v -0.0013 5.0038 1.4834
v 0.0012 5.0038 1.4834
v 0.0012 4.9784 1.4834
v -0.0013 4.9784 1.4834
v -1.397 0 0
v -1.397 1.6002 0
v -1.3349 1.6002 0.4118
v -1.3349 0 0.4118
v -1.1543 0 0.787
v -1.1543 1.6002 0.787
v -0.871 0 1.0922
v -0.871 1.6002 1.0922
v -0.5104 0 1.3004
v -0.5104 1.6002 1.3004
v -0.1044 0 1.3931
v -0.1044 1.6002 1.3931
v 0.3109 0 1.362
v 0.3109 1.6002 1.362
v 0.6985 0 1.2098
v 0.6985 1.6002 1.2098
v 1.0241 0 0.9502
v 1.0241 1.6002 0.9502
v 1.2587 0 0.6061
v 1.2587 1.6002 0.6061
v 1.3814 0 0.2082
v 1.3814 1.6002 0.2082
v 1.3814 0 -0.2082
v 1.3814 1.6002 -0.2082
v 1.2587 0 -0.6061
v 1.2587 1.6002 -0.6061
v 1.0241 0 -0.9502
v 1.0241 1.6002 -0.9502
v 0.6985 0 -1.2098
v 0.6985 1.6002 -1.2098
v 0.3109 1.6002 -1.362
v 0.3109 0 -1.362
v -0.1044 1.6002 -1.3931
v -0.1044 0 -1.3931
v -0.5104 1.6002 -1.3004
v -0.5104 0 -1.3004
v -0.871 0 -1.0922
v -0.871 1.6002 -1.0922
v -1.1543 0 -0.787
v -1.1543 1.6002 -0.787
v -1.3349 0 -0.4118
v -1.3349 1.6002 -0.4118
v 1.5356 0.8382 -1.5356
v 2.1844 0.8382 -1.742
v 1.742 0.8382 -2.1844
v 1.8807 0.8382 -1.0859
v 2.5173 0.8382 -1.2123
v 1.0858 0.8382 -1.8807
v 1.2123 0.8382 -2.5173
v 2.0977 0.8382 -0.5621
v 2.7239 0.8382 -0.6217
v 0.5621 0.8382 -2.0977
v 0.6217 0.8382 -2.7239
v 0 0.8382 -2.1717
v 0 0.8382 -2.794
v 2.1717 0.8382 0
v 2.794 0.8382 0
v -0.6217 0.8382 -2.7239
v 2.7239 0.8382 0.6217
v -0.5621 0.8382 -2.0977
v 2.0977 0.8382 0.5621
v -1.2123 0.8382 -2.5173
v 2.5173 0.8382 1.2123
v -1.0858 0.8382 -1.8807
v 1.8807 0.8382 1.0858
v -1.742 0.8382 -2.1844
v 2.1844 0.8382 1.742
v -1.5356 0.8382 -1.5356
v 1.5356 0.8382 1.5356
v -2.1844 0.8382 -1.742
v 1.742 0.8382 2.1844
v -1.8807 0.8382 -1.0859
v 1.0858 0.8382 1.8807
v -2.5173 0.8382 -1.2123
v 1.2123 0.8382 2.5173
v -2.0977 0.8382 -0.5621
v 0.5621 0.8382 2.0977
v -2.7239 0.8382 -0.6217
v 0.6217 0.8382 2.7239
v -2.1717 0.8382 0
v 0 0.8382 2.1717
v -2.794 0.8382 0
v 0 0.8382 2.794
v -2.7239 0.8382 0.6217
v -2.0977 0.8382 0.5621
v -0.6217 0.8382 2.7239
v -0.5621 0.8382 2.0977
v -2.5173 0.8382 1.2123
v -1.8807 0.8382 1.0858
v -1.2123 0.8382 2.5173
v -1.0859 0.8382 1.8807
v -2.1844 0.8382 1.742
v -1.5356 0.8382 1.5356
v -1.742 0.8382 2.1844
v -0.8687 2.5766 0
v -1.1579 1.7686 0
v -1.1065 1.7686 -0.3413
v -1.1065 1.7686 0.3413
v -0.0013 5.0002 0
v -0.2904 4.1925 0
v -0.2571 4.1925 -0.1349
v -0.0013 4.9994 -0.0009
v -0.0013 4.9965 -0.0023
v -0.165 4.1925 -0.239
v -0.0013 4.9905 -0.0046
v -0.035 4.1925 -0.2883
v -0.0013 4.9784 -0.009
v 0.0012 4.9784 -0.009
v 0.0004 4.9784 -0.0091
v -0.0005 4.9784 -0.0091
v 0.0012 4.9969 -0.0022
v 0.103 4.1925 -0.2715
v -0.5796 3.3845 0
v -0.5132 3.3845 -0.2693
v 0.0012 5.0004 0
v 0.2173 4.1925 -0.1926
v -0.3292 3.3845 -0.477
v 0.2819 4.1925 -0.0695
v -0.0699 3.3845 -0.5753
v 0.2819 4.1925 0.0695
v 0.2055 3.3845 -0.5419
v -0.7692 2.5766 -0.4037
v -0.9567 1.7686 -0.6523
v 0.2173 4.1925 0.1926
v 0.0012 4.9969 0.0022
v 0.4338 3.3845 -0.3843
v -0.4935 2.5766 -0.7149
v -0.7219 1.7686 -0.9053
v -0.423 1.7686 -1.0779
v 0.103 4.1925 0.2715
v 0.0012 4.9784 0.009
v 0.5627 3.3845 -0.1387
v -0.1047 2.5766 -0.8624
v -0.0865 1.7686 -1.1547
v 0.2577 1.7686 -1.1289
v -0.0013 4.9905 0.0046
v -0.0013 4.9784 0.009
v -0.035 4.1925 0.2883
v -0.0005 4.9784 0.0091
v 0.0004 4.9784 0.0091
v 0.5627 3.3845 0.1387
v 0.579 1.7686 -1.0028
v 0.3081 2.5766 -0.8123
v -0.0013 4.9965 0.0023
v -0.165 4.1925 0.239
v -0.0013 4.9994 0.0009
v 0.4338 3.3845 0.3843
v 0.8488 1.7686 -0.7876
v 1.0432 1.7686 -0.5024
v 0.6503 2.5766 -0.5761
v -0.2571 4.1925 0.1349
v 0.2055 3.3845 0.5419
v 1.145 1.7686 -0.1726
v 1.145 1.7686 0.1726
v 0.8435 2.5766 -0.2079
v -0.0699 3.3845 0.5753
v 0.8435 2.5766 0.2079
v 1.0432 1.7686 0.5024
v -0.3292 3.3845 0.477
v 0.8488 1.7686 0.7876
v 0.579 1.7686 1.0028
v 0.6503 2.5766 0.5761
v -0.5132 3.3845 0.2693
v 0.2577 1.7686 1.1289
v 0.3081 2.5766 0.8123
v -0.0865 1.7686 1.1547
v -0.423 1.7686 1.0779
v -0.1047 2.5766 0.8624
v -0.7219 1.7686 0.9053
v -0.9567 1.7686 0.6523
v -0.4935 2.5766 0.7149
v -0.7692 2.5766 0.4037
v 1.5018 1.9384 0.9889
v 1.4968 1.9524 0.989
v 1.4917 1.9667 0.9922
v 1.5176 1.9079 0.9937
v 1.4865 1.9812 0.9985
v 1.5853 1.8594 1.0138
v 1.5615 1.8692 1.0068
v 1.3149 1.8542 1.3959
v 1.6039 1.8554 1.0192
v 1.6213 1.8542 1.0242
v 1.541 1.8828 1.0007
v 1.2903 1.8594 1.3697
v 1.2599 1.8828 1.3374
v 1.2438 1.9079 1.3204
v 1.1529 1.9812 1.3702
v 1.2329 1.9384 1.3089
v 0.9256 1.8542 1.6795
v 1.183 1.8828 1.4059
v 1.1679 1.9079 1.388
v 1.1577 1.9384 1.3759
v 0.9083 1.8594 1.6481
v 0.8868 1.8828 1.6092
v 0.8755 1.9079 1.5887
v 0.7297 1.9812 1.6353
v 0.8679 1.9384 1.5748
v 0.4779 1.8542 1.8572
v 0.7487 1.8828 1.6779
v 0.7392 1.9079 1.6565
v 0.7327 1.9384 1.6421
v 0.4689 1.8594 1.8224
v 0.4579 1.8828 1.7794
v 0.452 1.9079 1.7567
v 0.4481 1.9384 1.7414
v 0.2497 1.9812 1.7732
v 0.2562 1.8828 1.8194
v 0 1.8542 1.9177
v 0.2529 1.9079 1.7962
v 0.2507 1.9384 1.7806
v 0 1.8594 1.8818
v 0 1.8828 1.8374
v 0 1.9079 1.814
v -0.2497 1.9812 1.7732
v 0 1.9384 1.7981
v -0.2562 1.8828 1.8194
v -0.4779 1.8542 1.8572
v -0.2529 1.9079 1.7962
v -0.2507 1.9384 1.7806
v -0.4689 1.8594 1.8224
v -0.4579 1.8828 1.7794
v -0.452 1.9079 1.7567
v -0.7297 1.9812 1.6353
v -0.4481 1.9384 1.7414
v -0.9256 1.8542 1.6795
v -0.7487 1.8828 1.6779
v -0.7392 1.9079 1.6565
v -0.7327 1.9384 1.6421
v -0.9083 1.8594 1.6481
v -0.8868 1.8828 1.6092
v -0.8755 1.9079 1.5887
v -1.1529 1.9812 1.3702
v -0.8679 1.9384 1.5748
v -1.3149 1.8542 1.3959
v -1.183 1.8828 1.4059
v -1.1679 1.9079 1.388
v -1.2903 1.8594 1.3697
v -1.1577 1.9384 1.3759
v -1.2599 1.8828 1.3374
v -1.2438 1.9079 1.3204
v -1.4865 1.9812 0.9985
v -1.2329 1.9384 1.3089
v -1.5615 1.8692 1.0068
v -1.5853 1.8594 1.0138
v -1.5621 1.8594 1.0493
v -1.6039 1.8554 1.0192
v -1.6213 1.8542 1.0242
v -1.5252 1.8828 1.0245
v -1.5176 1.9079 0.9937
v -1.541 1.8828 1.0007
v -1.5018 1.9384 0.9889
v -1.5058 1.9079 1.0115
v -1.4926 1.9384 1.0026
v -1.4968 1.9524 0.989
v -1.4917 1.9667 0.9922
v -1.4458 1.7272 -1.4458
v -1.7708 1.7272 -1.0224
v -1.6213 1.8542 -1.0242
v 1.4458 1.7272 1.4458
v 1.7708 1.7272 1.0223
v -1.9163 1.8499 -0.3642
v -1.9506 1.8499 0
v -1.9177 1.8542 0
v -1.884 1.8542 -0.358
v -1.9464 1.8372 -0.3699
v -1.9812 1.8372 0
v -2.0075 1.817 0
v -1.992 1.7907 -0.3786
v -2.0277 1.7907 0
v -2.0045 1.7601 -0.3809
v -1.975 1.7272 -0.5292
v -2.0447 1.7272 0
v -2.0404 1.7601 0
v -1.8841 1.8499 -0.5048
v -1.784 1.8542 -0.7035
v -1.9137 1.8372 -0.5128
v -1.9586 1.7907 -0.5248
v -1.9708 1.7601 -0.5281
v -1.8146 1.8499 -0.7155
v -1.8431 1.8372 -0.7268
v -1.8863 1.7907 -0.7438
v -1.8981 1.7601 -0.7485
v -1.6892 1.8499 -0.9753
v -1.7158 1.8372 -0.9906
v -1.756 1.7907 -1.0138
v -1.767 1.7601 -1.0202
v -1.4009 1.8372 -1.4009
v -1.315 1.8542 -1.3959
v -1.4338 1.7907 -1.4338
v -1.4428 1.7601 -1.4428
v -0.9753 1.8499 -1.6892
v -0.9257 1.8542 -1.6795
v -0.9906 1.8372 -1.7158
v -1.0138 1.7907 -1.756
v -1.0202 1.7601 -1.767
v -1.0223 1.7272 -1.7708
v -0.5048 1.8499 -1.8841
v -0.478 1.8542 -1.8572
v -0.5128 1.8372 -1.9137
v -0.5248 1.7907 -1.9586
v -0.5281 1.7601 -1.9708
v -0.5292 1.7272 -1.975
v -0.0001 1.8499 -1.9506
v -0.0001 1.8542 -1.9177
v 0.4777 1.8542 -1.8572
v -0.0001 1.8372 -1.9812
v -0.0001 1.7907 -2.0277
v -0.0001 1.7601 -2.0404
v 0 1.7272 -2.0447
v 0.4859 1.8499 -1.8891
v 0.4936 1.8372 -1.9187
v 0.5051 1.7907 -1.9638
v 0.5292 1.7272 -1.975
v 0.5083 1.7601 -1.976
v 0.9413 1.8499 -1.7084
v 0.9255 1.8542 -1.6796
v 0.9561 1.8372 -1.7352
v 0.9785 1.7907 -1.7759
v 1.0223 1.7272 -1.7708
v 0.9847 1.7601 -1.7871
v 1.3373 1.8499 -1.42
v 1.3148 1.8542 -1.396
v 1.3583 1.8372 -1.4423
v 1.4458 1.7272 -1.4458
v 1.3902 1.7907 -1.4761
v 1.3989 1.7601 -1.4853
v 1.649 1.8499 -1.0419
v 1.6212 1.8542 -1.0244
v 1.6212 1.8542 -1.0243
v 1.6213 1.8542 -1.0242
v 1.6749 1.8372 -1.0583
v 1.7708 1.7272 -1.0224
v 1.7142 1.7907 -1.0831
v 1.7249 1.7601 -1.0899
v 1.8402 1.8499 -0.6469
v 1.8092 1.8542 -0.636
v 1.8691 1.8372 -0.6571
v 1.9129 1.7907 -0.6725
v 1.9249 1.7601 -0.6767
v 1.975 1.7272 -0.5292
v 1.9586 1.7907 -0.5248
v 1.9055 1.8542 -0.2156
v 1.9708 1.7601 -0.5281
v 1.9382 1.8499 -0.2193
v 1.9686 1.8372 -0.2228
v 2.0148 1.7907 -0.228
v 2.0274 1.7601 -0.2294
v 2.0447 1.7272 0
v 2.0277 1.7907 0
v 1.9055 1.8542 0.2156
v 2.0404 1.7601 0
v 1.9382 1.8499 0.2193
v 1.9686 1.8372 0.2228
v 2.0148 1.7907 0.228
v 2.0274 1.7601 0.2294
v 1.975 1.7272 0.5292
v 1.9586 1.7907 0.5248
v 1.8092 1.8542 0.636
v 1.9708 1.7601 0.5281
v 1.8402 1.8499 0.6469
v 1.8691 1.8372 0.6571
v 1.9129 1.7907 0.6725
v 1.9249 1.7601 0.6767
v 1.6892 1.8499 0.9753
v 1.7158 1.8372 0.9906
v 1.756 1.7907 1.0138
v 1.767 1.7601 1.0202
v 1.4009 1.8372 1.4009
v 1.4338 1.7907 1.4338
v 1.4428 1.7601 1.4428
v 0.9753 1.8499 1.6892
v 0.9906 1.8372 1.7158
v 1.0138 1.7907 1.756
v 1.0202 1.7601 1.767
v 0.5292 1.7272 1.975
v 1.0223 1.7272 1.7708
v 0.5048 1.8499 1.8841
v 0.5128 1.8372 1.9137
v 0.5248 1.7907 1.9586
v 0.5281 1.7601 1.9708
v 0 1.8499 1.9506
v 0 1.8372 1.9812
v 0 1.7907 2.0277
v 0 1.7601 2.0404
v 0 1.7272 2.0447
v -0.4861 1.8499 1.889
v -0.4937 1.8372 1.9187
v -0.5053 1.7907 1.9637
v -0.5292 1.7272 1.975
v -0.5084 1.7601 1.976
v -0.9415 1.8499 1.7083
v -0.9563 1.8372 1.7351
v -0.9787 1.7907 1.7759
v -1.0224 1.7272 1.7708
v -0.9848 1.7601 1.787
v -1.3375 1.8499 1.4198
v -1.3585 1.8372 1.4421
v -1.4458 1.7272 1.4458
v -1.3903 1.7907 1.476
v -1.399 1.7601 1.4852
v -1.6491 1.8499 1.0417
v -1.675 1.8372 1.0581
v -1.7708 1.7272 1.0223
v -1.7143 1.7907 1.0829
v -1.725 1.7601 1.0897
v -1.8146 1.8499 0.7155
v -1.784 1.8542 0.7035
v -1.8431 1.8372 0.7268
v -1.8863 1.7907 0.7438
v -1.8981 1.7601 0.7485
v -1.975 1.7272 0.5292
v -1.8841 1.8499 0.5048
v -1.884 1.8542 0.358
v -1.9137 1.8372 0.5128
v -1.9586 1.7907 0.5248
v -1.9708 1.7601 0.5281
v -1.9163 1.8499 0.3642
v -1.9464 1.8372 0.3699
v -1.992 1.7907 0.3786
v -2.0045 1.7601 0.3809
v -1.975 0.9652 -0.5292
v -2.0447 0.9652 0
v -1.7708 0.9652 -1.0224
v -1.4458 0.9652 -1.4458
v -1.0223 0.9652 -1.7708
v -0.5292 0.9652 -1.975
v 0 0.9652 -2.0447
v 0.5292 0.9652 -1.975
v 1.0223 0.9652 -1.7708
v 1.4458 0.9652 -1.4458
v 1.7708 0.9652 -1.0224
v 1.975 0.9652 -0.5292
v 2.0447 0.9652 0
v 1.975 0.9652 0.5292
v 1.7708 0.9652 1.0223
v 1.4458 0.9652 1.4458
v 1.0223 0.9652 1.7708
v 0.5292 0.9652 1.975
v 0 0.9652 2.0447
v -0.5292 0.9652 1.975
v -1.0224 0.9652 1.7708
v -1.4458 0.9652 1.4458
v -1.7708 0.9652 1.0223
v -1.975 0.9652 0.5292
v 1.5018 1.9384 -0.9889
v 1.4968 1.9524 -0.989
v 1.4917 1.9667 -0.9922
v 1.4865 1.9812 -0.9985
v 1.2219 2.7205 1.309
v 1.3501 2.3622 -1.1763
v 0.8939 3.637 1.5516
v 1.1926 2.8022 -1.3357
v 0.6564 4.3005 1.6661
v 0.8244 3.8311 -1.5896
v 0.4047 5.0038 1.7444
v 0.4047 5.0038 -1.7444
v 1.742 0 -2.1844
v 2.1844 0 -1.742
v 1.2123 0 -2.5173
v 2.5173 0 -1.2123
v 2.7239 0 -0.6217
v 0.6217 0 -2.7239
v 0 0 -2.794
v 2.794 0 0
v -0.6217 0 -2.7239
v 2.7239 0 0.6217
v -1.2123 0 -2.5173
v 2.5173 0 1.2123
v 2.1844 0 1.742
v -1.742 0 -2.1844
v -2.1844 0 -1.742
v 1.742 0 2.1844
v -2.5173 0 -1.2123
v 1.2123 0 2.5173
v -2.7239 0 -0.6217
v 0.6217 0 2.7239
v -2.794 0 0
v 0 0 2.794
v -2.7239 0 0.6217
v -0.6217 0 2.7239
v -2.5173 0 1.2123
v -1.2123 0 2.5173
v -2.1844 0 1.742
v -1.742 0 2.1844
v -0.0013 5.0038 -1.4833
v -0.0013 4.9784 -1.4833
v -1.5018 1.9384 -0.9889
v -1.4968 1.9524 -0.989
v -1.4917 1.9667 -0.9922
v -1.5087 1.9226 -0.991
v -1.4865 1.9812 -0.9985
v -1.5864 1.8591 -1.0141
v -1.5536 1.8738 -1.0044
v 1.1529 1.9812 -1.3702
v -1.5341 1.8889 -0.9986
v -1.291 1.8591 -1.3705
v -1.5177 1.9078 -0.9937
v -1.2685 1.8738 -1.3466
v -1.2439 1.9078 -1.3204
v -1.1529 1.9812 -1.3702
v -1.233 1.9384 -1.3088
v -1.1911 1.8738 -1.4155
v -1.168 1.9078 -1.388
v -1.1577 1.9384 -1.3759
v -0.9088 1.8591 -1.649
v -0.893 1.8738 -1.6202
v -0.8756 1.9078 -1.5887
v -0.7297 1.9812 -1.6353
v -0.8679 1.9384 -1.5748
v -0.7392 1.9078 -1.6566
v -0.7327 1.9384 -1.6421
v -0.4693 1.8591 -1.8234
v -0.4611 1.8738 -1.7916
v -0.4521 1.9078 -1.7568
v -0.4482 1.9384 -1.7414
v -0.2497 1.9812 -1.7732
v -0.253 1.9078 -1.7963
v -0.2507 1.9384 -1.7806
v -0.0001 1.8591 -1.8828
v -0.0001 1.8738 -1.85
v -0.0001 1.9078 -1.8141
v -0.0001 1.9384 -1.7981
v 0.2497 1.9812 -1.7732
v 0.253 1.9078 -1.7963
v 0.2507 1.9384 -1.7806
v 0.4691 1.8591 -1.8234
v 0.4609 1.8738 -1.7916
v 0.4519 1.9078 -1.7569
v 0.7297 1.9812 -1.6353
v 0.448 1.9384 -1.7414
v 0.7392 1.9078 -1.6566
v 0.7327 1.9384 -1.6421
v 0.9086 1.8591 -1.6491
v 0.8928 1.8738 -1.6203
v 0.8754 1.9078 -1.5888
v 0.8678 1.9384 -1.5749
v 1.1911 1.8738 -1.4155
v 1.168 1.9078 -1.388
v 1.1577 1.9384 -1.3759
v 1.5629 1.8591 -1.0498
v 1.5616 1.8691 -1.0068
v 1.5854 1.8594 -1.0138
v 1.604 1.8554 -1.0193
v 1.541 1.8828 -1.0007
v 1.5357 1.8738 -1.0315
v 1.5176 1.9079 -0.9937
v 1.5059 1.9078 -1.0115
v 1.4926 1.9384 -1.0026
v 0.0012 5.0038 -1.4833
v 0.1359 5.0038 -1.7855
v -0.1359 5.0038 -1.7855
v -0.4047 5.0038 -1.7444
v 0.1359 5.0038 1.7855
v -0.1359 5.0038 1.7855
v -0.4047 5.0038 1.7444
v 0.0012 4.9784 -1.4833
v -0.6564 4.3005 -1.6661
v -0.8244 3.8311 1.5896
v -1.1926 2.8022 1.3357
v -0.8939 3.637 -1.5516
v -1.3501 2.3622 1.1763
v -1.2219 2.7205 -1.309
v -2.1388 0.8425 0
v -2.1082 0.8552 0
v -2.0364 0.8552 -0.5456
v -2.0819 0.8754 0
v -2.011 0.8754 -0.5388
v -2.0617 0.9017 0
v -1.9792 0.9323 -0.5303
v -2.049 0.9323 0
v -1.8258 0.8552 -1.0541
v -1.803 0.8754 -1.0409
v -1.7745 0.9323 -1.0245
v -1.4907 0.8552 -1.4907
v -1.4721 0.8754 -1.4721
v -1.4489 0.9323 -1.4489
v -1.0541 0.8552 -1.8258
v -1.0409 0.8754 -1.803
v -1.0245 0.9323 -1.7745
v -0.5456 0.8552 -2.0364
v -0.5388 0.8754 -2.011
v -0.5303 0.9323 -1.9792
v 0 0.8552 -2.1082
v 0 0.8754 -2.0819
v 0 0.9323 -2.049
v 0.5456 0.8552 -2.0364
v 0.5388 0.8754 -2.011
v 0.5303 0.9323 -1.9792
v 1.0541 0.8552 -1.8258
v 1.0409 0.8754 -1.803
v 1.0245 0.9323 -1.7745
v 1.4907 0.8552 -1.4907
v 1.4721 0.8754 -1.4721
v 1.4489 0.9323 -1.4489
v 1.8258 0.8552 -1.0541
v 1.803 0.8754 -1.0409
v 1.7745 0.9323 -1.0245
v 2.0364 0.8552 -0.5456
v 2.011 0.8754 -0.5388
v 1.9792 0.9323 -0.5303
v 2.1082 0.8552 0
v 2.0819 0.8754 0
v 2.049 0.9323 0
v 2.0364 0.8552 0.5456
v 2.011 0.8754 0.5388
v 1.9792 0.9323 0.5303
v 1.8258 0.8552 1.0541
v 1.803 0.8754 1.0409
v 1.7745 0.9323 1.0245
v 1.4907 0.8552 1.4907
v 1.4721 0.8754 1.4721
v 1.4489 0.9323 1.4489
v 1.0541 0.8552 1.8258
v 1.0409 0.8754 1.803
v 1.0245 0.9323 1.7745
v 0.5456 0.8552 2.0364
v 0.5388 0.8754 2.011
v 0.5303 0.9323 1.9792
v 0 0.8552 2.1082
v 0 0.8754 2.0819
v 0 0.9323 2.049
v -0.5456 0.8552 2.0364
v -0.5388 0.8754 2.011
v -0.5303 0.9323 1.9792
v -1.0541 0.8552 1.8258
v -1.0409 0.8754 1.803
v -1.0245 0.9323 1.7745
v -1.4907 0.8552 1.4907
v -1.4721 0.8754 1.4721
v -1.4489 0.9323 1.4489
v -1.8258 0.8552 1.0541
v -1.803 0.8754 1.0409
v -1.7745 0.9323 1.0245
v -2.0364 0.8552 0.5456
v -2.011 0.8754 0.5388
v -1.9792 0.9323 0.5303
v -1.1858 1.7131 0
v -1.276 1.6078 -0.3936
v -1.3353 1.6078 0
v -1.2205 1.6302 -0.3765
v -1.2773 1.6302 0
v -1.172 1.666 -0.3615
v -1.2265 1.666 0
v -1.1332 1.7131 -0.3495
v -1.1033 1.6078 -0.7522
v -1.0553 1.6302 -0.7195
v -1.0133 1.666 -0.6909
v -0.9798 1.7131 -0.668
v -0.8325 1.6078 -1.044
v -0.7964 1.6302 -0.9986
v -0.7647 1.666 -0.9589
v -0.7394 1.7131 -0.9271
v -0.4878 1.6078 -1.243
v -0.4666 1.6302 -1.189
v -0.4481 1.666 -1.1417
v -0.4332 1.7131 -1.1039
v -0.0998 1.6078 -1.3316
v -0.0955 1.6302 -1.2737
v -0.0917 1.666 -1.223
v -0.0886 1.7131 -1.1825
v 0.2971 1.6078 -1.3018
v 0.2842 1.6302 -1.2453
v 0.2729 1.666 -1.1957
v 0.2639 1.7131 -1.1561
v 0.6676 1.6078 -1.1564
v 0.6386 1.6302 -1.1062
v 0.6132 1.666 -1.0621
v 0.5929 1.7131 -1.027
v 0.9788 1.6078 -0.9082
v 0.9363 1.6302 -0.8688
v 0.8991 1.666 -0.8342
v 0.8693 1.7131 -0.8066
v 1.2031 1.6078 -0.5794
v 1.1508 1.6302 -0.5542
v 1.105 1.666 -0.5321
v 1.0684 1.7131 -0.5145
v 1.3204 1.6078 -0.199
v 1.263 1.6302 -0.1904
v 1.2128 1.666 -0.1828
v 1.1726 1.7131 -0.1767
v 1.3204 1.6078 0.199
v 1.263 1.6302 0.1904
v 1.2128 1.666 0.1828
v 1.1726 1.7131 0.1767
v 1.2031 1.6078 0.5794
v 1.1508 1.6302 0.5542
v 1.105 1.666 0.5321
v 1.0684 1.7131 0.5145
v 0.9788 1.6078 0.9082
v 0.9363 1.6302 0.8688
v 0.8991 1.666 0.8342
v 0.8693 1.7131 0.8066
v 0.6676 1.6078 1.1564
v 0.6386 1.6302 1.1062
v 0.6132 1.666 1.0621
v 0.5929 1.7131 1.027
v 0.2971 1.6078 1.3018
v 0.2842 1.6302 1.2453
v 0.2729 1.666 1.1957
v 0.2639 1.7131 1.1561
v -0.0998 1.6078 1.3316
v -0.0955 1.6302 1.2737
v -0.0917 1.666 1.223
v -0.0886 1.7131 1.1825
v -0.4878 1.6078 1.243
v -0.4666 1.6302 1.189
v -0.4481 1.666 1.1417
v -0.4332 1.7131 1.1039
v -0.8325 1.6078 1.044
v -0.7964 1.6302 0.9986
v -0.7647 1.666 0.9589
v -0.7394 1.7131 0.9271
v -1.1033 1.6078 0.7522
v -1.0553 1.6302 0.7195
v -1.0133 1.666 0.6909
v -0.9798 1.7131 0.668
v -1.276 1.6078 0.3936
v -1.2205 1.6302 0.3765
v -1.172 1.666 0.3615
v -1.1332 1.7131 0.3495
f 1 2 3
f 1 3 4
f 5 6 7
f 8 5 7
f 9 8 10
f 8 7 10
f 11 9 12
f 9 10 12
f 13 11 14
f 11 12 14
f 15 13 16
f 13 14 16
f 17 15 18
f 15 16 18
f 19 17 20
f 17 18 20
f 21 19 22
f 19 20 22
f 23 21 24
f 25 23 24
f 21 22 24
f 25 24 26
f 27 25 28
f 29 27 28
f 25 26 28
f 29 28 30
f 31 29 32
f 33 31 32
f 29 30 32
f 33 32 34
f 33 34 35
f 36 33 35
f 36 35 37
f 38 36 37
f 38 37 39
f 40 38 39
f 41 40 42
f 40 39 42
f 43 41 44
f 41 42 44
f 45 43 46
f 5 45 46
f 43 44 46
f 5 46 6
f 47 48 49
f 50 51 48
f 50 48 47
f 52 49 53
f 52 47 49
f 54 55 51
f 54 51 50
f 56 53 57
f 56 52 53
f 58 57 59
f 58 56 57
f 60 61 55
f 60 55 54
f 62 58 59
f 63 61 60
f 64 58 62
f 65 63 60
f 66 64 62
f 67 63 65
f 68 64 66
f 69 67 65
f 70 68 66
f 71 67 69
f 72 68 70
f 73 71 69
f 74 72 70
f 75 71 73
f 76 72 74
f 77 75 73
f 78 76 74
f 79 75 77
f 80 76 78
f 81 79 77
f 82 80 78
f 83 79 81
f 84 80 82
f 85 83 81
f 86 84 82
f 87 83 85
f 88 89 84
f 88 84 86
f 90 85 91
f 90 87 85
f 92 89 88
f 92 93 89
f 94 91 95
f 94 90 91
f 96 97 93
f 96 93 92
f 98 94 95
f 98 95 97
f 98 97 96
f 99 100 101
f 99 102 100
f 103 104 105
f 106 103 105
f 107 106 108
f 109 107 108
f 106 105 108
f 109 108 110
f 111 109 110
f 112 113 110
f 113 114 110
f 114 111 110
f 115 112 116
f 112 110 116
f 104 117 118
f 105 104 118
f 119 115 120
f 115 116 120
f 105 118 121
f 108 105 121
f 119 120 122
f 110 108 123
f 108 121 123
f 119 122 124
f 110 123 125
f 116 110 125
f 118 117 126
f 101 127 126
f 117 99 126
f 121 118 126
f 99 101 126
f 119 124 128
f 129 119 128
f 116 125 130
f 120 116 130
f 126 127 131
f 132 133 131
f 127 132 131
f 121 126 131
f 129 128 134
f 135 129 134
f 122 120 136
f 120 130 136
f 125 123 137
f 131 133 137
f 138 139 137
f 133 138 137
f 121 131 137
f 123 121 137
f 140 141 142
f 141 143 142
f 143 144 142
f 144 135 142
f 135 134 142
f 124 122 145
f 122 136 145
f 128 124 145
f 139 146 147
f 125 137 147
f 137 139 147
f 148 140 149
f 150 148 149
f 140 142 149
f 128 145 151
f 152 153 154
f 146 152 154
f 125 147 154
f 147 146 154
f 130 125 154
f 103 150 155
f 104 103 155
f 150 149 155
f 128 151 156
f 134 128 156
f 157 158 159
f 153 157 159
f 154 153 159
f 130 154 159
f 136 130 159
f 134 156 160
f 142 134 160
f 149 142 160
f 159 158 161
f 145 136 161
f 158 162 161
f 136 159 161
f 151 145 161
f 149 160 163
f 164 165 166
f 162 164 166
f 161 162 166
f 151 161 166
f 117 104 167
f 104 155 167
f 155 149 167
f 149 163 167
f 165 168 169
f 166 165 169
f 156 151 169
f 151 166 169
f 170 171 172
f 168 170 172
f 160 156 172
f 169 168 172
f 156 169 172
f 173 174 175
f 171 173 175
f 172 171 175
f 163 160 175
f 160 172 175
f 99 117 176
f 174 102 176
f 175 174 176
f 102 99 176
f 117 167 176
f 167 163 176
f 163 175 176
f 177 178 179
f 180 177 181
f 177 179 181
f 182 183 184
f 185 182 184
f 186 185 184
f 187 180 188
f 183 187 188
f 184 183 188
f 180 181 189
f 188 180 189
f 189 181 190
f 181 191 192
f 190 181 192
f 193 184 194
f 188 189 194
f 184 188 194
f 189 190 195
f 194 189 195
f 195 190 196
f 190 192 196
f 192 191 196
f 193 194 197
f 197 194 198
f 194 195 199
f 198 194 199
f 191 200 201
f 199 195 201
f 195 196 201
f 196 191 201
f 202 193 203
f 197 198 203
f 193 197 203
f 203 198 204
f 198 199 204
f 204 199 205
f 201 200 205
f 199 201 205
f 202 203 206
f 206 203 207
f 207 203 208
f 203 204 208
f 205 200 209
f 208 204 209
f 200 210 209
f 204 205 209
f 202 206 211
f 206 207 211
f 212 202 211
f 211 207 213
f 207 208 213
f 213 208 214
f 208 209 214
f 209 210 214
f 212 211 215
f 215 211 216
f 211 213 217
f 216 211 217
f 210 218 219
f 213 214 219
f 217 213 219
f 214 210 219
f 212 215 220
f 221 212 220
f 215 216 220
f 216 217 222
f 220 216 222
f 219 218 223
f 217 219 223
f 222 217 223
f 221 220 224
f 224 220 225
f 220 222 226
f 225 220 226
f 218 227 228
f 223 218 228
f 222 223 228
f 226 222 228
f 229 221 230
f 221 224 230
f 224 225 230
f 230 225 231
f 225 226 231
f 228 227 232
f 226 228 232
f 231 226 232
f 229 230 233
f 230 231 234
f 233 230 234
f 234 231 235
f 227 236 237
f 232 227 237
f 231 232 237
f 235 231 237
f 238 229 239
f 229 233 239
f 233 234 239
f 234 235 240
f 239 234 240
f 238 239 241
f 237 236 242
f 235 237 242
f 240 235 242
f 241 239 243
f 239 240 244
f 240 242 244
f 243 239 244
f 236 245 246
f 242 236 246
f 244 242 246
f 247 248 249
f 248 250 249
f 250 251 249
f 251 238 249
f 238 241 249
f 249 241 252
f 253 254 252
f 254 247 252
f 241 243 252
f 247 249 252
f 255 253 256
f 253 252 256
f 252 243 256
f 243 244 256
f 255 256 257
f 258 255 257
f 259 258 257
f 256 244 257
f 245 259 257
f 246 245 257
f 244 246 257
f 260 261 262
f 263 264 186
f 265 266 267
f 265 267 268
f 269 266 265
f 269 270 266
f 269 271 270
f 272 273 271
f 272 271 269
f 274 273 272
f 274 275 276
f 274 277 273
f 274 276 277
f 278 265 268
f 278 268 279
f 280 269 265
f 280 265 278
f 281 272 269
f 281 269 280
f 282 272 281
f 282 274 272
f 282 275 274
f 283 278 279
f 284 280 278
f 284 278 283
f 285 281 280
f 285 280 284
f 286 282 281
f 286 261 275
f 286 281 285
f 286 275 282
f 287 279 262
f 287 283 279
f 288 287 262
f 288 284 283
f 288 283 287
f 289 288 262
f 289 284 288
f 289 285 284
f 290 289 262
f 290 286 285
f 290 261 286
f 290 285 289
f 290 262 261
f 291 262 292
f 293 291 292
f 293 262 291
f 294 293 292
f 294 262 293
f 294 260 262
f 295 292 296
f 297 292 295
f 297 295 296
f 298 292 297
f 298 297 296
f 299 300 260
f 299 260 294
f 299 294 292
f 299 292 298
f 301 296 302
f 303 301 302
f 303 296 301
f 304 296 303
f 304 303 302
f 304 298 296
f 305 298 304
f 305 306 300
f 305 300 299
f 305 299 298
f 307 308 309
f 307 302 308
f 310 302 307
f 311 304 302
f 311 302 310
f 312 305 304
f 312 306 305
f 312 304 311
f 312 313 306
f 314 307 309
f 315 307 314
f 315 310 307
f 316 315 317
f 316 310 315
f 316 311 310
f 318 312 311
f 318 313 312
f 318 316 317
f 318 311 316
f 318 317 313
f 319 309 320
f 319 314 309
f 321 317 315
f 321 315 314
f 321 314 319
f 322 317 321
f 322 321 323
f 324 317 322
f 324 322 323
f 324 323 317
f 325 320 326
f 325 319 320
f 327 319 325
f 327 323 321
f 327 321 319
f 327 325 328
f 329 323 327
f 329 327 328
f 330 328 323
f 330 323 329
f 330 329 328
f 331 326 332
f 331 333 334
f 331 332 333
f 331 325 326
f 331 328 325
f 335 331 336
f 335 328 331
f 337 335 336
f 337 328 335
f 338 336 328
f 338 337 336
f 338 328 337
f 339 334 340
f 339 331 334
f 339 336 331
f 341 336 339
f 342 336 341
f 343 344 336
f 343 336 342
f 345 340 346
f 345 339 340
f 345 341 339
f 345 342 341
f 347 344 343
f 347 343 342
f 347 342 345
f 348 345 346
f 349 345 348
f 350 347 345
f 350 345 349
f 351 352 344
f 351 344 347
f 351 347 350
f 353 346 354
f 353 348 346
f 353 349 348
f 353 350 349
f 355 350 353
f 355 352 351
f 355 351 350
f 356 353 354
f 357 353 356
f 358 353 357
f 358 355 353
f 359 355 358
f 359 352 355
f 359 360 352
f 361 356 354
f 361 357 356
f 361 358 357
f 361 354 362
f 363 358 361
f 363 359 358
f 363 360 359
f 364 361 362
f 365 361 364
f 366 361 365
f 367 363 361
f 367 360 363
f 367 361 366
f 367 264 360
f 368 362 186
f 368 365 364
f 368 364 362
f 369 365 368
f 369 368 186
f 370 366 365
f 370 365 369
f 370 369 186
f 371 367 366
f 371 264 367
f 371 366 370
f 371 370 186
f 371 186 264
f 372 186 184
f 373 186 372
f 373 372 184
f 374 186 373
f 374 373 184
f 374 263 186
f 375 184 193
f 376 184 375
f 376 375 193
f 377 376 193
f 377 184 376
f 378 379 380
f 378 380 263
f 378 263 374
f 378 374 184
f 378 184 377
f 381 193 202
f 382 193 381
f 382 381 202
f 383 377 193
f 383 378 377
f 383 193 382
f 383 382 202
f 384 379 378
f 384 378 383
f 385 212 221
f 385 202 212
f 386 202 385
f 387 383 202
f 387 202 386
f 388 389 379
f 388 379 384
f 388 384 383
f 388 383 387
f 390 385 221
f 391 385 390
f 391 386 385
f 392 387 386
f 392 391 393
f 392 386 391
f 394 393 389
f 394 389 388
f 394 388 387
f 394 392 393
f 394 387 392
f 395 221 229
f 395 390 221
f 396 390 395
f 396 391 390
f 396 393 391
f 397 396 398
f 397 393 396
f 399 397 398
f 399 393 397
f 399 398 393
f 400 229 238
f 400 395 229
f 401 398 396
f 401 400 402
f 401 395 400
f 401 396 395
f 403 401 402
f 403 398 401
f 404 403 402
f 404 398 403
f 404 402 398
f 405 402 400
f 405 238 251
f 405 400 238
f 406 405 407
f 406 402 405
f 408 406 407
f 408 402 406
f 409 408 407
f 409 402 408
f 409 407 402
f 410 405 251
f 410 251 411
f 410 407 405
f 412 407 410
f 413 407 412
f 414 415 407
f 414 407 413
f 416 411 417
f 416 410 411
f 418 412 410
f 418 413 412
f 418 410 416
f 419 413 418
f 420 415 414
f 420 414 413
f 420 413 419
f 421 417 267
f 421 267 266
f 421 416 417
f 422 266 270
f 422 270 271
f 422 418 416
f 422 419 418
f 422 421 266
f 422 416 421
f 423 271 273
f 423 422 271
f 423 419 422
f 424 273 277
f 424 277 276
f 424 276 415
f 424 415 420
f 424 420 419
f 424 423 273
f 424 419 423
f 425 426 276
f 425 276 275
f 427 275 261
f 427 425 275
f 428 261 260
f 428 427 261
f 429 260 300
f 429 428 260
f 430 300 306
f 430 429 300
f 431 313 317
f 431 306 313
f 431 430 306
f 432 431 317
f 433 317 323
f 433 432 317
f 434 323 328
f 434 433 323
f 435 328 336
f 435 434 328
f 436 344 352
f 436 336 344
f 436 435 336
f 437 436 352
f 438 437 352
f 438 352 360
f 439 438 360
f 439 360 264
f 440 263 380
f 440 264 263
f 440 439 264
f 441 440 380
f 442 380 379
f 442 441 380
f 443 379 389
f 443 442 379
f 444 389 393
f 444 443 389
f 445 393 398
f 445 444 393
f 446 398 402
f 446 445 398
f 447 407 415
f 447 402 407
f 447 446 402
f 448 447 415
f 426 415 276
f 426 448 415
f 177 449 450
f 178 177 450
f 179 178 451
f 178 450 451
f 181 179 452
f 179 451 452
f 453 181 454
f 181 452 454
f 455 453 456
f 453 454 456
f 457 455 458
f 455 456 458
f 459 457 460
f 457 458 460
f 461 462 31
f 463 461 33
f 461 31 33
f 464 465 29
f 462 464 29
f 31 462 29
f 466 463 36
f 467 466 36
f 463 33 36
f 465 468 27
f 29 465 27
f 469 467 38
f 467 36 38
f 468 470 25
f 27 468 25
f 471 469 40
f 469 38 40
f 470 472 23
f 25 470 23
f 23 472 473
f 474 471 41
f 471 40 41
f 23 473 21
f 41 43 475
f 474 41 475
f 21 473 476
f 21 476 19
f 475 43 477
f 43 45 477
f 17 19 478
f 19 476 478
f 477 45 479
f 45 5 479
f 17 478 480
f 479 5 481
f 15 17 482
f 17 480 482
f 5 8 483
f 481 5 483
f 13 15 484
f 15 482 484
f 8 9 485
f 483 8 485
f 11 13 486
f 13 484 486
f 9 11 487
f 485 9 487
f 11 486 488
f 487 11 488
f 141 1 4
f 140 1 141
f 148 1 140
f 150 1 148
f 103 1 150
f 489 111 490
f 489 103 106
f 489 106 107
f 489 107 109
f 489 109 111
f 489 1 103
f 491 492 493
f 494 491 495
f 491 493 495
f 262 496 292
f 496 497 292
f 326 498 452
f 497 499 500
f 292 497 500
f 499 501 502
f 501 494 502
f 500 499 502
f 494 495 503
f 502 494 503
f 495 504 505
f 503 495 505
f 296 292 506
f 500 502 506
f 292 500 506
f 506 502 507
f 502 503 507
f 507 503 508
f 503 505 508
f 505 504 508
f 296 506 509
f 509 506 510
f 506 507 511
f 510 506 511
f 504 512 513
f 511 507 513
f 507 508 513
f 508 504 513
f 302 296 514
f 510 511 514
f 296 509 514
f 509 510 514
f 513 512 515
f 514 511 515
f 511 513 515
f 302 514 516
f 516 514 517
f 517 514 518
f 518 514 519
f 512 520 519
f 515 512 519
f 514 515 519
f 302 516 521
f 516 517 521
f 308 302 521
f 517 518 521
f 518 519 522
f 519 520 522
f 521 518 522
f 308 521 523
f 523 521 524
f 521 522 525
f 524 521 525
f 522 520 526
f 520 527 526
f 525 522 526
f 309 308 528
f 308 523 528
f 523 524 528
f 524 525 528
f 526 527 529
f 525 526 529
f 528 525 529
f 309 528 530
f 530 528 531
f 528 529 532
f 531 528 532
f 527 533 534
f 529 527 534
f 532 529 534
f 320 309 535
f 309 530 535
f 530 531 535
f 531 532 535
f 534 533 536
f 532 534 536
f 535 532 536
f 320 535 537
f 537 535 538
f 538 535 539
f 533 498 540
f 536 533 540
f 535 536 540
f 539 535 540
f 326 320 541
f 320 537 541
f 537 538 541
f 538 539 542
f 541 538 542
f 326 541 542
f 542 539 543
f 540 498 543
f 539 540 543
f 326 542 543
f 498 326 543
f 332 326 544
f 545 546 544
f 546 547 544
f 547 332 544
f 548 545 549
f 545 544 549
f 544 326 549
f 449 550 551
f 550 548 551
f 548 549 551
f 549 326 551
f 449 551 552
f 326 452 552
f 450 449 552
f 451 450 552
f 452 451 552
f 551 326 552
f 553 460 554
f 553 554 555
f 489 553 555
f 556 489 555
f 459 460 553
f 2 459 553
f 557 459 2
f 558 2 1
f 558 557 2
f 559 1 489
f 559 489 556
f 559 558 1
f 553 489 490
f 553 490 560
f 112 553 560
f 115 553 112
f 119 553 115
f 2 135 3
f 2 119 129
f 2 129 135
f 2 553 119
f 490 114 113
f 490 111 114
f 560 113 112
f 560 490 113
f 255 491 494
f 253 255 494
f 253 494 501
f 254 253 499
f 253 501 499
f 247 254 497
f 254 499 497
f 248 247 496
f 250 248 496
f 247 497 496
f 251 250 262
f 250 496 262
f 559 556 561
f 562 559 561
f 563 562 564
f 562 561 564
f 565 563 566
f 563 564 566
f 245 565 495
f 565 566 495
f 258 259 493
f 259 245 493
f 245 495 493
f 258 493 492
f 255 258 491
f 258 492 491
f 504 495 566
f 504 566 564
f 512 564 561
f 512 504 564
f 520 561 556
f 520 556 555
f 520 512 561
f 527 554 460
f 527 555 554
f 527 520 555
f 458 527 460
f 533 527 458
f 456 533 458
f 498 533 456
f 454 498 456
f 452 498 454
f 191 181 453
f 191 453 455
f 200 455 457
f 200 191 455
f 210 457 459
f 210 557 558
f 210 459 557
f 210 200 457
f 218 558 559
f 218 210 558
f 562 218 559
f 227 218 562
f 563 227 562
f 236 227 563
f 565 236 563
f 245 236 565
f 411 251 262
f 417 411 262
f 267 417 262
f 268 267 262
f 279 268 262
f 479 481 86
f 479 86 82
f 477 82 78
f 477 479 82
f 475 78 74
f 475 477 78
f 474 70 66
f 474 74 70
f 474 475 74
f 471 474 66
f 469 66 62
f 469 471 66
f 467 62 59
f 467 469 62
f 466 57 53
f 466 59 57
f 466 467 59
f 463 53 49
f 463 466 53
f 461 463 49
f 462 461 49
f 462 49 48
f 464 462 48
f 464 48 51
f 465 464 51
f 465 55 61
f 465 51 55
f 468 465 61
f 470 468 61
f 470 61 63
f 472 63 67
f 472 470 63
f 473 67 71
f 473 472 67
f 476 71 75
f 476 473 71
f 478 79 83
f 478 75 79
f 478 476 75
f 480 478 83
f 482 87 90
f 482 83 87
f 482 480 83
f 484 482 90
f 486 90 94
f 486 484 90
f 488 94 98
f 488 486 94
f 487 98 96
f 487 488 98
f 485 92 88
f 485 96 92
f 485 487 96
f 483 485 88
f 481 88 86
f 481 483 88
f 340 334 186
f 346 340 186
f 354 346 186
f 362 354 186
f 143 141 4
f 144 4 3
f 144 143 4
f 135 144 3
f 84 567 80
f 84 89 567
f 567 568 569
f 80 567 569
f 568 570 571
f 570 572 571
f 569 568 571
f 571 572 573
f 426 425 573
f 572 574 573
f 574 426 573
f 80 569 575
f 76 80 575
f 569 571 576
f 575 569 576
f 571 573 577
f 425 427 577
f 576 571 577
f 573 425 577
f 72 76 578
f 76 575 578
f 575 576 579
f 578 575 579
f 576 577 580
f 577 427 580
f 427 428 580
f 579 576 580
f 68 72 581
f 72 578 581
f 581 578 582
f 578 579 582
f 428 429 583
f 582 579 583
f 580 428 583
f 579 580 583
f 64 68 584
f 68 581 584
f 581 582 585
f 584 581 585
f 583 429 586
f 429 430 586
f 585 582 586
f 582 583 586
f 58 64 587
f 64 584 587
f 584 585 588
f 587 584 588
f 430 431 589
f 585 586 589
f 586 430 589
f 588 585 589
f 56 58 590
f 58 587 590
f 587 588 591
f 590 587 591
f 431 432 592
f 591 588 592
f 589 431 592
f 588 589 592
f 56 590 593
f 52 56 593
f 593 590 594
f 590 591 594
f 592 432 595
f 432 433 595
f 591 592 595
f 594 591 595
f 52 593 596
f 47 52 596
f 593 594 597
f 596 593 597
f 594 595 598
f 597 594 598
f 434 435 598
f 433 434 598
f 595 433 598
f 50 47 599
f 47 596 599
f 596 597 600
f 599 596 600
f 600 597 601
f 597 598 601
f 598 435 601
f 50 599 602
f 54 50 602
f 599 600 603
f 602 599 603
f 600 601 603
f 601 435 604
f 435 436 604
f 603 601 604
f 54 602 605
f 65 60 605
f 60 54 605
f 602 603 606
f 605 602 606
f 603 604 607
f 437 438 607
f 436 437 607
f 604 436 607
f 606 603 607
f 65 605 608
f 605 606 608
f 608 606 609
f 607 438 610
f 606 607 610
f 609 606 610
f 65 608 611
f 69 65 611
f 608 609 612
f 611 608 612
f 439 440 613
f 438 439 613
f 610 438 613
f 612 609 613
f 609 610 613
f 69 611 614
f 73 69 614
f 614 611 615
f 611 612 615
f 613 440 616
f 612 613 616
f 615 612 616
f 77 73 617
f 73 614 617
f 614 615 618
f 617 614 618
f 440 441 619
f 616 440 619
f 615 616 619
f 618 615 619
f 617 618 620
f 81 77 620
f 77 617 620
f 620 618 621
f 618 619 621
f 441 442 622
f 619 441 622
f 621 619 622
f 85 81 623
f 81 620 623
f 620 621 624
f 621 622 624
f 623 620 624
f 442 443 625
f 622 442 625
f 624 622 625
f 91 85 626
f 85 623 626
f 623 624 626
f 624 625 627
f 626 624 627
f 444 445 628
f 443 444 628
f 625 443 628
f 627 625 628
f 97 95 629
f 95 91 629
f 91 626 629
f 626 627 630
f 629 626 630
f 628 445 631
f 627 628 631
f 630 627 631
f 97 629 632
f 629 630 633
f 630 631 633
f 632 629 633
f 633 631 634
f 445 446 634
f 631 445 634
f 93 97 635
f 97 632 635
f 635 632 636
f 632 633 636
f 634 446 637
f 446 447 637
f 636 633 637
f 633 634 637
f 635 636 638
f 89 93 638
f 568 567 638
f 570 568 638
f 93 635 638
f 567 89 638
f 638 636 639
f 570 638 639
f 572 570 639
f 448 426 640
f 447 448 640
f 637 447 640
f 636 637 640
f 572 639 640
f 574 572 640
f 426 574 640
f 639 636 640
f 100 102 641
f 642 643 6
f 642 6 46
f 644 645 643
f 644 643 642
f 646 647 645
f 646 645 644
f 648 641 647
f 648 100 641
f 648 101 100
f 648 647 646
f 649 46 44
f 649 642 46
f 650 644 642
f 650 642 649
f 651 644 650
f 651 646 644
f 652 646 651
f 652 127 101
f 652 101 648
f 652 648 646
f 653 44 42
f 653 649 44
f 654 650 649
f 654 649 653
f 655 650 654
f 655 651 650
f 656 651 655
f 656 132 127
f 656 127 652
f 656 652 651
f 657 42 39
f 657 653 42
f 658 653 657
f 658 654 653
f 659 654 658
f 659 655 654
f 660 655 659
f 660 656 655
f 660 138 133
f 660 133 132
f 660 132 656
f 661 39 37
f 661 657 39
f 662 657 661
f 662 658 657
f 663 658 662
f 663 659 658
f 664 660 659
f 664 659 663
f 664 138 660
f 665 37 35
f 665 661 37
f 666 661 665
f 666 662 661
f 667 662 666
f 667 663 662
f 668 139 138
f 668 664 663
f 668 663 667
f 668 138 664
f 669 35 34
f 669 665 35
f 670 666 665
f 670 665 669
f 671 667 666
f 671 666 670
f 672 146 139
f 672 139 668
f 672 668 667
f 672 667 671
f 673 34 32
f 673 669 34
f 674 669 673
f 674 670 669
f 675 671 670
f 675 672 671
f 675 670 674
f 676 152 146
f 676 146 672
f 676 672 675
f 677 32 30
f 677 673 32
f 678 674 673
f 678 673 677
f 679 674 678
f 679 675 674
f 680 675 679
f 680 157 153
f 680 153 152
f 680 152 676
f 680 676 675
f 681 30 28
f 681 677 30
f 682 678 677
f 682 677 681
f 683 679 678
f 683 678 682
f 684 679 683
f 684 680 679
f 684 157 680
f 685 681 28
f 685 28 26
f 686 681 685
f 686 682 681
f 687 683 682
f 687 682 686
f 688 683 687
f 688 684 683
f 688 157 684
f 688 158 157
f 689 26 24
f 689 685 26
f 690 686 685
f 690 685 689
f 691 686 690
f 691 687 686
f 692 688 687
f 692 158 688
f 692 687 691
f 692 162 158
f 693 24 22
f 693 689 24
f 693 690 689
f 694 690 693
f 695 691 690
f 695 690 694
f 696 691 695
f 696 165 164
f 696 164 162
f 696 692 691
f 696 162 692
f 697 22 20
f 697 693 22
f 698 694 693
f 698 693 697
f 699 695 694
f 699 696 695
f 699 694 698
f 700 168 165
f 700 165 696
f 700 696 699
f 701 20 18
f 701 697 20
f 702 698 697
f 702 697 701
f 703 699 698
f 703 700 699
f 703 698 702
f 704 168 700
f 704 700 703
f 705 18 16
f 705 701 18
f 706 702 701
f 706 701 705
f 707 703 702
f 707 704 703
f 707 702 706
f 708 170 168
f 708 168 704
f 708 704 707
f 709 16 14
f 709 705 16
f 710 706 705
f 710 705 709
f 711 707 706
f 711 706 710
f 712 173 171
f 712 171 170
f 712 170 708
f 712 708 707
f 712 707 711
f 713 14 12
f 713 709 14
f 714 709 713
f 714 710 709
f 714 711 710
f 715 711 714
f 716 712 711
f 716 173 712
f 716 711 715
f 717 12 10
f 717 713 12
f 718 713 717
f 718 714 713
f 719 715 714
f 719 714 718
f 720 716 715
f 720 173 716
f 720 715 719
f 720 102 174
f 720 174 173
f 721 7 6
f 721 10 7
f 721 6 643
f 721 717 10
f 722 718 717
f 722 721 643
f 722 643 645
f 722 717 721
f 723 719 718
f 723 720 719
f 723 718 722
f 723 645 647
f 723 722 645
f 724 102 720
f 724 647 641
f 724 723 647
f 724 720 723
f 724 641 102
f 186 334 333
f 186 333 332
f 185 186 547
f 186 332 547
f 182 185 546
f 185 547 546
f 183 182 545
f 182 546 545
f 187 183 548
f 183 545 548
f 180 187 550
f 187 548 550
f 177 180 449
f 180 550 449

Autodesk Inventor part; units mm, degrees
ref_plane "YZ Plane" through (0, 0, 0) normal (1, 0, 0) x (0, 1, 0)
ref_plane "XZ Plane" through (0, 0, 0) normal (0, 1, 0) x (-1, 0, 0)
ref_plane "XY Plane" through (0, 0, 0) normal (0, 0, 1) x (1, 0, 0)
sketch "Sketch1" plane through (0, 0, 0) normal (0, 0, 1) x (1, 0, 0)
  line L0 (0, -1.0008) -> (0, 6.0046) construction
  line L1 (-0.4047, 5.0038) -> (-1.5018, 1.9384)
  line L2 (-1.6213, 1.8542) -> (-1.9177, 1.8542)
  line L3 (-2.0447, 1.7272) -> (-2.0447, 0.9652)
  line L4 (-2.1717, 0.8382) -> (-2.794, 0.8382)
  line L5 (-2.794, 0.8382) -> (-2.794, 0)
  line L6 (-2.794, 0) -> (-1.397, 0)
  line L7 (-1.397, 0) -> (-1.397, 1.6002)
  arc A0 (-1.397, 1.6002) -> (-1.1579, 1.7686) centre (-1.397, 1.8542) ccw
  line L8 (-1.1579, 1.7686) -> (0, 5.0038)
  line L9 (-0.4047, 5.0038) -> (0, 5.0038)
  arc A1 (-1.6213, 1.8542) -> (-1.5018, 1.9384) centre (-1.6213, 1.9812) ccw
  arc A2 (-1.9177, 1.8542) -> (-2.0447, 1.7272) centre (-1.9177, 1.7272) ccw
  arc A3 (-2.1717, 0.8382) -> (-2.0447, 0.9652) centre (-2.1717, 0.9652) ccw
  line L10 (-1.7907, 5.0038) -> (-1.7907, 1.9812)
  arc A4 (-1.9177, 1.8542) -> (-1.7907, 1.9812) centre (-1.9177, 1.9812) ccw
  line L11 (-1.7907, 5.0038) -> (-0.4047, 5.0038)
  point P0 (0, 0)
  dimension "d0" = 5.588
  dimension "d1" = 0.8382
  dimension "d2" = 4.0894
  dimension "d5" = 0.381
  dimension "d7" = 0.127
  dimension "d8" = 5.0038
  dimension "d9" = 1.016
  dimension "d10" = 0.254
  dimension "d11" = 0.254
  dimension "d18" = 2.794
revolve "Revolution1" add sketch "Sketch1" angle 360 about axis through (0, -10, 0) along (0, 1, 0)
extrude "Extrusion1" cut sketch "Sketch1" along normal through all both and the other way through all contours L1 A1 L2 A4 L10 L11
mirror "Mirror1" about plane through (0, 0, 0) normal (1, 0, 0) of "Extrusion1"
sketch "Sketch2" plane through (-0.4047, 5.0038, 1.7444) normal (0, 1, 0) x (1, 0, 0)
  line L0 (0.4047, 3.2277) -> (0.4047, 0.261) construction
  line L1 (0.4034, 3.2277) -> (0.4059, 3.2277)
  line L2 (0.4059, 3.2277) -> (0.4059, 0.261)
  line L3 (0.4059, 0.261) -> (0.4034, 0.261)
  line L4 (0.4034, 0.261) -> (0.4034, 3.2277)
  point P0 (0.4047, 1.7444)
  dimension "d15" = 0.0025
extrude "Extrusion2" cut sketch "Sketch2" against normal blind 0.0254
properties part number "DU039.005-952.01" material "ML952 REZLYN"
